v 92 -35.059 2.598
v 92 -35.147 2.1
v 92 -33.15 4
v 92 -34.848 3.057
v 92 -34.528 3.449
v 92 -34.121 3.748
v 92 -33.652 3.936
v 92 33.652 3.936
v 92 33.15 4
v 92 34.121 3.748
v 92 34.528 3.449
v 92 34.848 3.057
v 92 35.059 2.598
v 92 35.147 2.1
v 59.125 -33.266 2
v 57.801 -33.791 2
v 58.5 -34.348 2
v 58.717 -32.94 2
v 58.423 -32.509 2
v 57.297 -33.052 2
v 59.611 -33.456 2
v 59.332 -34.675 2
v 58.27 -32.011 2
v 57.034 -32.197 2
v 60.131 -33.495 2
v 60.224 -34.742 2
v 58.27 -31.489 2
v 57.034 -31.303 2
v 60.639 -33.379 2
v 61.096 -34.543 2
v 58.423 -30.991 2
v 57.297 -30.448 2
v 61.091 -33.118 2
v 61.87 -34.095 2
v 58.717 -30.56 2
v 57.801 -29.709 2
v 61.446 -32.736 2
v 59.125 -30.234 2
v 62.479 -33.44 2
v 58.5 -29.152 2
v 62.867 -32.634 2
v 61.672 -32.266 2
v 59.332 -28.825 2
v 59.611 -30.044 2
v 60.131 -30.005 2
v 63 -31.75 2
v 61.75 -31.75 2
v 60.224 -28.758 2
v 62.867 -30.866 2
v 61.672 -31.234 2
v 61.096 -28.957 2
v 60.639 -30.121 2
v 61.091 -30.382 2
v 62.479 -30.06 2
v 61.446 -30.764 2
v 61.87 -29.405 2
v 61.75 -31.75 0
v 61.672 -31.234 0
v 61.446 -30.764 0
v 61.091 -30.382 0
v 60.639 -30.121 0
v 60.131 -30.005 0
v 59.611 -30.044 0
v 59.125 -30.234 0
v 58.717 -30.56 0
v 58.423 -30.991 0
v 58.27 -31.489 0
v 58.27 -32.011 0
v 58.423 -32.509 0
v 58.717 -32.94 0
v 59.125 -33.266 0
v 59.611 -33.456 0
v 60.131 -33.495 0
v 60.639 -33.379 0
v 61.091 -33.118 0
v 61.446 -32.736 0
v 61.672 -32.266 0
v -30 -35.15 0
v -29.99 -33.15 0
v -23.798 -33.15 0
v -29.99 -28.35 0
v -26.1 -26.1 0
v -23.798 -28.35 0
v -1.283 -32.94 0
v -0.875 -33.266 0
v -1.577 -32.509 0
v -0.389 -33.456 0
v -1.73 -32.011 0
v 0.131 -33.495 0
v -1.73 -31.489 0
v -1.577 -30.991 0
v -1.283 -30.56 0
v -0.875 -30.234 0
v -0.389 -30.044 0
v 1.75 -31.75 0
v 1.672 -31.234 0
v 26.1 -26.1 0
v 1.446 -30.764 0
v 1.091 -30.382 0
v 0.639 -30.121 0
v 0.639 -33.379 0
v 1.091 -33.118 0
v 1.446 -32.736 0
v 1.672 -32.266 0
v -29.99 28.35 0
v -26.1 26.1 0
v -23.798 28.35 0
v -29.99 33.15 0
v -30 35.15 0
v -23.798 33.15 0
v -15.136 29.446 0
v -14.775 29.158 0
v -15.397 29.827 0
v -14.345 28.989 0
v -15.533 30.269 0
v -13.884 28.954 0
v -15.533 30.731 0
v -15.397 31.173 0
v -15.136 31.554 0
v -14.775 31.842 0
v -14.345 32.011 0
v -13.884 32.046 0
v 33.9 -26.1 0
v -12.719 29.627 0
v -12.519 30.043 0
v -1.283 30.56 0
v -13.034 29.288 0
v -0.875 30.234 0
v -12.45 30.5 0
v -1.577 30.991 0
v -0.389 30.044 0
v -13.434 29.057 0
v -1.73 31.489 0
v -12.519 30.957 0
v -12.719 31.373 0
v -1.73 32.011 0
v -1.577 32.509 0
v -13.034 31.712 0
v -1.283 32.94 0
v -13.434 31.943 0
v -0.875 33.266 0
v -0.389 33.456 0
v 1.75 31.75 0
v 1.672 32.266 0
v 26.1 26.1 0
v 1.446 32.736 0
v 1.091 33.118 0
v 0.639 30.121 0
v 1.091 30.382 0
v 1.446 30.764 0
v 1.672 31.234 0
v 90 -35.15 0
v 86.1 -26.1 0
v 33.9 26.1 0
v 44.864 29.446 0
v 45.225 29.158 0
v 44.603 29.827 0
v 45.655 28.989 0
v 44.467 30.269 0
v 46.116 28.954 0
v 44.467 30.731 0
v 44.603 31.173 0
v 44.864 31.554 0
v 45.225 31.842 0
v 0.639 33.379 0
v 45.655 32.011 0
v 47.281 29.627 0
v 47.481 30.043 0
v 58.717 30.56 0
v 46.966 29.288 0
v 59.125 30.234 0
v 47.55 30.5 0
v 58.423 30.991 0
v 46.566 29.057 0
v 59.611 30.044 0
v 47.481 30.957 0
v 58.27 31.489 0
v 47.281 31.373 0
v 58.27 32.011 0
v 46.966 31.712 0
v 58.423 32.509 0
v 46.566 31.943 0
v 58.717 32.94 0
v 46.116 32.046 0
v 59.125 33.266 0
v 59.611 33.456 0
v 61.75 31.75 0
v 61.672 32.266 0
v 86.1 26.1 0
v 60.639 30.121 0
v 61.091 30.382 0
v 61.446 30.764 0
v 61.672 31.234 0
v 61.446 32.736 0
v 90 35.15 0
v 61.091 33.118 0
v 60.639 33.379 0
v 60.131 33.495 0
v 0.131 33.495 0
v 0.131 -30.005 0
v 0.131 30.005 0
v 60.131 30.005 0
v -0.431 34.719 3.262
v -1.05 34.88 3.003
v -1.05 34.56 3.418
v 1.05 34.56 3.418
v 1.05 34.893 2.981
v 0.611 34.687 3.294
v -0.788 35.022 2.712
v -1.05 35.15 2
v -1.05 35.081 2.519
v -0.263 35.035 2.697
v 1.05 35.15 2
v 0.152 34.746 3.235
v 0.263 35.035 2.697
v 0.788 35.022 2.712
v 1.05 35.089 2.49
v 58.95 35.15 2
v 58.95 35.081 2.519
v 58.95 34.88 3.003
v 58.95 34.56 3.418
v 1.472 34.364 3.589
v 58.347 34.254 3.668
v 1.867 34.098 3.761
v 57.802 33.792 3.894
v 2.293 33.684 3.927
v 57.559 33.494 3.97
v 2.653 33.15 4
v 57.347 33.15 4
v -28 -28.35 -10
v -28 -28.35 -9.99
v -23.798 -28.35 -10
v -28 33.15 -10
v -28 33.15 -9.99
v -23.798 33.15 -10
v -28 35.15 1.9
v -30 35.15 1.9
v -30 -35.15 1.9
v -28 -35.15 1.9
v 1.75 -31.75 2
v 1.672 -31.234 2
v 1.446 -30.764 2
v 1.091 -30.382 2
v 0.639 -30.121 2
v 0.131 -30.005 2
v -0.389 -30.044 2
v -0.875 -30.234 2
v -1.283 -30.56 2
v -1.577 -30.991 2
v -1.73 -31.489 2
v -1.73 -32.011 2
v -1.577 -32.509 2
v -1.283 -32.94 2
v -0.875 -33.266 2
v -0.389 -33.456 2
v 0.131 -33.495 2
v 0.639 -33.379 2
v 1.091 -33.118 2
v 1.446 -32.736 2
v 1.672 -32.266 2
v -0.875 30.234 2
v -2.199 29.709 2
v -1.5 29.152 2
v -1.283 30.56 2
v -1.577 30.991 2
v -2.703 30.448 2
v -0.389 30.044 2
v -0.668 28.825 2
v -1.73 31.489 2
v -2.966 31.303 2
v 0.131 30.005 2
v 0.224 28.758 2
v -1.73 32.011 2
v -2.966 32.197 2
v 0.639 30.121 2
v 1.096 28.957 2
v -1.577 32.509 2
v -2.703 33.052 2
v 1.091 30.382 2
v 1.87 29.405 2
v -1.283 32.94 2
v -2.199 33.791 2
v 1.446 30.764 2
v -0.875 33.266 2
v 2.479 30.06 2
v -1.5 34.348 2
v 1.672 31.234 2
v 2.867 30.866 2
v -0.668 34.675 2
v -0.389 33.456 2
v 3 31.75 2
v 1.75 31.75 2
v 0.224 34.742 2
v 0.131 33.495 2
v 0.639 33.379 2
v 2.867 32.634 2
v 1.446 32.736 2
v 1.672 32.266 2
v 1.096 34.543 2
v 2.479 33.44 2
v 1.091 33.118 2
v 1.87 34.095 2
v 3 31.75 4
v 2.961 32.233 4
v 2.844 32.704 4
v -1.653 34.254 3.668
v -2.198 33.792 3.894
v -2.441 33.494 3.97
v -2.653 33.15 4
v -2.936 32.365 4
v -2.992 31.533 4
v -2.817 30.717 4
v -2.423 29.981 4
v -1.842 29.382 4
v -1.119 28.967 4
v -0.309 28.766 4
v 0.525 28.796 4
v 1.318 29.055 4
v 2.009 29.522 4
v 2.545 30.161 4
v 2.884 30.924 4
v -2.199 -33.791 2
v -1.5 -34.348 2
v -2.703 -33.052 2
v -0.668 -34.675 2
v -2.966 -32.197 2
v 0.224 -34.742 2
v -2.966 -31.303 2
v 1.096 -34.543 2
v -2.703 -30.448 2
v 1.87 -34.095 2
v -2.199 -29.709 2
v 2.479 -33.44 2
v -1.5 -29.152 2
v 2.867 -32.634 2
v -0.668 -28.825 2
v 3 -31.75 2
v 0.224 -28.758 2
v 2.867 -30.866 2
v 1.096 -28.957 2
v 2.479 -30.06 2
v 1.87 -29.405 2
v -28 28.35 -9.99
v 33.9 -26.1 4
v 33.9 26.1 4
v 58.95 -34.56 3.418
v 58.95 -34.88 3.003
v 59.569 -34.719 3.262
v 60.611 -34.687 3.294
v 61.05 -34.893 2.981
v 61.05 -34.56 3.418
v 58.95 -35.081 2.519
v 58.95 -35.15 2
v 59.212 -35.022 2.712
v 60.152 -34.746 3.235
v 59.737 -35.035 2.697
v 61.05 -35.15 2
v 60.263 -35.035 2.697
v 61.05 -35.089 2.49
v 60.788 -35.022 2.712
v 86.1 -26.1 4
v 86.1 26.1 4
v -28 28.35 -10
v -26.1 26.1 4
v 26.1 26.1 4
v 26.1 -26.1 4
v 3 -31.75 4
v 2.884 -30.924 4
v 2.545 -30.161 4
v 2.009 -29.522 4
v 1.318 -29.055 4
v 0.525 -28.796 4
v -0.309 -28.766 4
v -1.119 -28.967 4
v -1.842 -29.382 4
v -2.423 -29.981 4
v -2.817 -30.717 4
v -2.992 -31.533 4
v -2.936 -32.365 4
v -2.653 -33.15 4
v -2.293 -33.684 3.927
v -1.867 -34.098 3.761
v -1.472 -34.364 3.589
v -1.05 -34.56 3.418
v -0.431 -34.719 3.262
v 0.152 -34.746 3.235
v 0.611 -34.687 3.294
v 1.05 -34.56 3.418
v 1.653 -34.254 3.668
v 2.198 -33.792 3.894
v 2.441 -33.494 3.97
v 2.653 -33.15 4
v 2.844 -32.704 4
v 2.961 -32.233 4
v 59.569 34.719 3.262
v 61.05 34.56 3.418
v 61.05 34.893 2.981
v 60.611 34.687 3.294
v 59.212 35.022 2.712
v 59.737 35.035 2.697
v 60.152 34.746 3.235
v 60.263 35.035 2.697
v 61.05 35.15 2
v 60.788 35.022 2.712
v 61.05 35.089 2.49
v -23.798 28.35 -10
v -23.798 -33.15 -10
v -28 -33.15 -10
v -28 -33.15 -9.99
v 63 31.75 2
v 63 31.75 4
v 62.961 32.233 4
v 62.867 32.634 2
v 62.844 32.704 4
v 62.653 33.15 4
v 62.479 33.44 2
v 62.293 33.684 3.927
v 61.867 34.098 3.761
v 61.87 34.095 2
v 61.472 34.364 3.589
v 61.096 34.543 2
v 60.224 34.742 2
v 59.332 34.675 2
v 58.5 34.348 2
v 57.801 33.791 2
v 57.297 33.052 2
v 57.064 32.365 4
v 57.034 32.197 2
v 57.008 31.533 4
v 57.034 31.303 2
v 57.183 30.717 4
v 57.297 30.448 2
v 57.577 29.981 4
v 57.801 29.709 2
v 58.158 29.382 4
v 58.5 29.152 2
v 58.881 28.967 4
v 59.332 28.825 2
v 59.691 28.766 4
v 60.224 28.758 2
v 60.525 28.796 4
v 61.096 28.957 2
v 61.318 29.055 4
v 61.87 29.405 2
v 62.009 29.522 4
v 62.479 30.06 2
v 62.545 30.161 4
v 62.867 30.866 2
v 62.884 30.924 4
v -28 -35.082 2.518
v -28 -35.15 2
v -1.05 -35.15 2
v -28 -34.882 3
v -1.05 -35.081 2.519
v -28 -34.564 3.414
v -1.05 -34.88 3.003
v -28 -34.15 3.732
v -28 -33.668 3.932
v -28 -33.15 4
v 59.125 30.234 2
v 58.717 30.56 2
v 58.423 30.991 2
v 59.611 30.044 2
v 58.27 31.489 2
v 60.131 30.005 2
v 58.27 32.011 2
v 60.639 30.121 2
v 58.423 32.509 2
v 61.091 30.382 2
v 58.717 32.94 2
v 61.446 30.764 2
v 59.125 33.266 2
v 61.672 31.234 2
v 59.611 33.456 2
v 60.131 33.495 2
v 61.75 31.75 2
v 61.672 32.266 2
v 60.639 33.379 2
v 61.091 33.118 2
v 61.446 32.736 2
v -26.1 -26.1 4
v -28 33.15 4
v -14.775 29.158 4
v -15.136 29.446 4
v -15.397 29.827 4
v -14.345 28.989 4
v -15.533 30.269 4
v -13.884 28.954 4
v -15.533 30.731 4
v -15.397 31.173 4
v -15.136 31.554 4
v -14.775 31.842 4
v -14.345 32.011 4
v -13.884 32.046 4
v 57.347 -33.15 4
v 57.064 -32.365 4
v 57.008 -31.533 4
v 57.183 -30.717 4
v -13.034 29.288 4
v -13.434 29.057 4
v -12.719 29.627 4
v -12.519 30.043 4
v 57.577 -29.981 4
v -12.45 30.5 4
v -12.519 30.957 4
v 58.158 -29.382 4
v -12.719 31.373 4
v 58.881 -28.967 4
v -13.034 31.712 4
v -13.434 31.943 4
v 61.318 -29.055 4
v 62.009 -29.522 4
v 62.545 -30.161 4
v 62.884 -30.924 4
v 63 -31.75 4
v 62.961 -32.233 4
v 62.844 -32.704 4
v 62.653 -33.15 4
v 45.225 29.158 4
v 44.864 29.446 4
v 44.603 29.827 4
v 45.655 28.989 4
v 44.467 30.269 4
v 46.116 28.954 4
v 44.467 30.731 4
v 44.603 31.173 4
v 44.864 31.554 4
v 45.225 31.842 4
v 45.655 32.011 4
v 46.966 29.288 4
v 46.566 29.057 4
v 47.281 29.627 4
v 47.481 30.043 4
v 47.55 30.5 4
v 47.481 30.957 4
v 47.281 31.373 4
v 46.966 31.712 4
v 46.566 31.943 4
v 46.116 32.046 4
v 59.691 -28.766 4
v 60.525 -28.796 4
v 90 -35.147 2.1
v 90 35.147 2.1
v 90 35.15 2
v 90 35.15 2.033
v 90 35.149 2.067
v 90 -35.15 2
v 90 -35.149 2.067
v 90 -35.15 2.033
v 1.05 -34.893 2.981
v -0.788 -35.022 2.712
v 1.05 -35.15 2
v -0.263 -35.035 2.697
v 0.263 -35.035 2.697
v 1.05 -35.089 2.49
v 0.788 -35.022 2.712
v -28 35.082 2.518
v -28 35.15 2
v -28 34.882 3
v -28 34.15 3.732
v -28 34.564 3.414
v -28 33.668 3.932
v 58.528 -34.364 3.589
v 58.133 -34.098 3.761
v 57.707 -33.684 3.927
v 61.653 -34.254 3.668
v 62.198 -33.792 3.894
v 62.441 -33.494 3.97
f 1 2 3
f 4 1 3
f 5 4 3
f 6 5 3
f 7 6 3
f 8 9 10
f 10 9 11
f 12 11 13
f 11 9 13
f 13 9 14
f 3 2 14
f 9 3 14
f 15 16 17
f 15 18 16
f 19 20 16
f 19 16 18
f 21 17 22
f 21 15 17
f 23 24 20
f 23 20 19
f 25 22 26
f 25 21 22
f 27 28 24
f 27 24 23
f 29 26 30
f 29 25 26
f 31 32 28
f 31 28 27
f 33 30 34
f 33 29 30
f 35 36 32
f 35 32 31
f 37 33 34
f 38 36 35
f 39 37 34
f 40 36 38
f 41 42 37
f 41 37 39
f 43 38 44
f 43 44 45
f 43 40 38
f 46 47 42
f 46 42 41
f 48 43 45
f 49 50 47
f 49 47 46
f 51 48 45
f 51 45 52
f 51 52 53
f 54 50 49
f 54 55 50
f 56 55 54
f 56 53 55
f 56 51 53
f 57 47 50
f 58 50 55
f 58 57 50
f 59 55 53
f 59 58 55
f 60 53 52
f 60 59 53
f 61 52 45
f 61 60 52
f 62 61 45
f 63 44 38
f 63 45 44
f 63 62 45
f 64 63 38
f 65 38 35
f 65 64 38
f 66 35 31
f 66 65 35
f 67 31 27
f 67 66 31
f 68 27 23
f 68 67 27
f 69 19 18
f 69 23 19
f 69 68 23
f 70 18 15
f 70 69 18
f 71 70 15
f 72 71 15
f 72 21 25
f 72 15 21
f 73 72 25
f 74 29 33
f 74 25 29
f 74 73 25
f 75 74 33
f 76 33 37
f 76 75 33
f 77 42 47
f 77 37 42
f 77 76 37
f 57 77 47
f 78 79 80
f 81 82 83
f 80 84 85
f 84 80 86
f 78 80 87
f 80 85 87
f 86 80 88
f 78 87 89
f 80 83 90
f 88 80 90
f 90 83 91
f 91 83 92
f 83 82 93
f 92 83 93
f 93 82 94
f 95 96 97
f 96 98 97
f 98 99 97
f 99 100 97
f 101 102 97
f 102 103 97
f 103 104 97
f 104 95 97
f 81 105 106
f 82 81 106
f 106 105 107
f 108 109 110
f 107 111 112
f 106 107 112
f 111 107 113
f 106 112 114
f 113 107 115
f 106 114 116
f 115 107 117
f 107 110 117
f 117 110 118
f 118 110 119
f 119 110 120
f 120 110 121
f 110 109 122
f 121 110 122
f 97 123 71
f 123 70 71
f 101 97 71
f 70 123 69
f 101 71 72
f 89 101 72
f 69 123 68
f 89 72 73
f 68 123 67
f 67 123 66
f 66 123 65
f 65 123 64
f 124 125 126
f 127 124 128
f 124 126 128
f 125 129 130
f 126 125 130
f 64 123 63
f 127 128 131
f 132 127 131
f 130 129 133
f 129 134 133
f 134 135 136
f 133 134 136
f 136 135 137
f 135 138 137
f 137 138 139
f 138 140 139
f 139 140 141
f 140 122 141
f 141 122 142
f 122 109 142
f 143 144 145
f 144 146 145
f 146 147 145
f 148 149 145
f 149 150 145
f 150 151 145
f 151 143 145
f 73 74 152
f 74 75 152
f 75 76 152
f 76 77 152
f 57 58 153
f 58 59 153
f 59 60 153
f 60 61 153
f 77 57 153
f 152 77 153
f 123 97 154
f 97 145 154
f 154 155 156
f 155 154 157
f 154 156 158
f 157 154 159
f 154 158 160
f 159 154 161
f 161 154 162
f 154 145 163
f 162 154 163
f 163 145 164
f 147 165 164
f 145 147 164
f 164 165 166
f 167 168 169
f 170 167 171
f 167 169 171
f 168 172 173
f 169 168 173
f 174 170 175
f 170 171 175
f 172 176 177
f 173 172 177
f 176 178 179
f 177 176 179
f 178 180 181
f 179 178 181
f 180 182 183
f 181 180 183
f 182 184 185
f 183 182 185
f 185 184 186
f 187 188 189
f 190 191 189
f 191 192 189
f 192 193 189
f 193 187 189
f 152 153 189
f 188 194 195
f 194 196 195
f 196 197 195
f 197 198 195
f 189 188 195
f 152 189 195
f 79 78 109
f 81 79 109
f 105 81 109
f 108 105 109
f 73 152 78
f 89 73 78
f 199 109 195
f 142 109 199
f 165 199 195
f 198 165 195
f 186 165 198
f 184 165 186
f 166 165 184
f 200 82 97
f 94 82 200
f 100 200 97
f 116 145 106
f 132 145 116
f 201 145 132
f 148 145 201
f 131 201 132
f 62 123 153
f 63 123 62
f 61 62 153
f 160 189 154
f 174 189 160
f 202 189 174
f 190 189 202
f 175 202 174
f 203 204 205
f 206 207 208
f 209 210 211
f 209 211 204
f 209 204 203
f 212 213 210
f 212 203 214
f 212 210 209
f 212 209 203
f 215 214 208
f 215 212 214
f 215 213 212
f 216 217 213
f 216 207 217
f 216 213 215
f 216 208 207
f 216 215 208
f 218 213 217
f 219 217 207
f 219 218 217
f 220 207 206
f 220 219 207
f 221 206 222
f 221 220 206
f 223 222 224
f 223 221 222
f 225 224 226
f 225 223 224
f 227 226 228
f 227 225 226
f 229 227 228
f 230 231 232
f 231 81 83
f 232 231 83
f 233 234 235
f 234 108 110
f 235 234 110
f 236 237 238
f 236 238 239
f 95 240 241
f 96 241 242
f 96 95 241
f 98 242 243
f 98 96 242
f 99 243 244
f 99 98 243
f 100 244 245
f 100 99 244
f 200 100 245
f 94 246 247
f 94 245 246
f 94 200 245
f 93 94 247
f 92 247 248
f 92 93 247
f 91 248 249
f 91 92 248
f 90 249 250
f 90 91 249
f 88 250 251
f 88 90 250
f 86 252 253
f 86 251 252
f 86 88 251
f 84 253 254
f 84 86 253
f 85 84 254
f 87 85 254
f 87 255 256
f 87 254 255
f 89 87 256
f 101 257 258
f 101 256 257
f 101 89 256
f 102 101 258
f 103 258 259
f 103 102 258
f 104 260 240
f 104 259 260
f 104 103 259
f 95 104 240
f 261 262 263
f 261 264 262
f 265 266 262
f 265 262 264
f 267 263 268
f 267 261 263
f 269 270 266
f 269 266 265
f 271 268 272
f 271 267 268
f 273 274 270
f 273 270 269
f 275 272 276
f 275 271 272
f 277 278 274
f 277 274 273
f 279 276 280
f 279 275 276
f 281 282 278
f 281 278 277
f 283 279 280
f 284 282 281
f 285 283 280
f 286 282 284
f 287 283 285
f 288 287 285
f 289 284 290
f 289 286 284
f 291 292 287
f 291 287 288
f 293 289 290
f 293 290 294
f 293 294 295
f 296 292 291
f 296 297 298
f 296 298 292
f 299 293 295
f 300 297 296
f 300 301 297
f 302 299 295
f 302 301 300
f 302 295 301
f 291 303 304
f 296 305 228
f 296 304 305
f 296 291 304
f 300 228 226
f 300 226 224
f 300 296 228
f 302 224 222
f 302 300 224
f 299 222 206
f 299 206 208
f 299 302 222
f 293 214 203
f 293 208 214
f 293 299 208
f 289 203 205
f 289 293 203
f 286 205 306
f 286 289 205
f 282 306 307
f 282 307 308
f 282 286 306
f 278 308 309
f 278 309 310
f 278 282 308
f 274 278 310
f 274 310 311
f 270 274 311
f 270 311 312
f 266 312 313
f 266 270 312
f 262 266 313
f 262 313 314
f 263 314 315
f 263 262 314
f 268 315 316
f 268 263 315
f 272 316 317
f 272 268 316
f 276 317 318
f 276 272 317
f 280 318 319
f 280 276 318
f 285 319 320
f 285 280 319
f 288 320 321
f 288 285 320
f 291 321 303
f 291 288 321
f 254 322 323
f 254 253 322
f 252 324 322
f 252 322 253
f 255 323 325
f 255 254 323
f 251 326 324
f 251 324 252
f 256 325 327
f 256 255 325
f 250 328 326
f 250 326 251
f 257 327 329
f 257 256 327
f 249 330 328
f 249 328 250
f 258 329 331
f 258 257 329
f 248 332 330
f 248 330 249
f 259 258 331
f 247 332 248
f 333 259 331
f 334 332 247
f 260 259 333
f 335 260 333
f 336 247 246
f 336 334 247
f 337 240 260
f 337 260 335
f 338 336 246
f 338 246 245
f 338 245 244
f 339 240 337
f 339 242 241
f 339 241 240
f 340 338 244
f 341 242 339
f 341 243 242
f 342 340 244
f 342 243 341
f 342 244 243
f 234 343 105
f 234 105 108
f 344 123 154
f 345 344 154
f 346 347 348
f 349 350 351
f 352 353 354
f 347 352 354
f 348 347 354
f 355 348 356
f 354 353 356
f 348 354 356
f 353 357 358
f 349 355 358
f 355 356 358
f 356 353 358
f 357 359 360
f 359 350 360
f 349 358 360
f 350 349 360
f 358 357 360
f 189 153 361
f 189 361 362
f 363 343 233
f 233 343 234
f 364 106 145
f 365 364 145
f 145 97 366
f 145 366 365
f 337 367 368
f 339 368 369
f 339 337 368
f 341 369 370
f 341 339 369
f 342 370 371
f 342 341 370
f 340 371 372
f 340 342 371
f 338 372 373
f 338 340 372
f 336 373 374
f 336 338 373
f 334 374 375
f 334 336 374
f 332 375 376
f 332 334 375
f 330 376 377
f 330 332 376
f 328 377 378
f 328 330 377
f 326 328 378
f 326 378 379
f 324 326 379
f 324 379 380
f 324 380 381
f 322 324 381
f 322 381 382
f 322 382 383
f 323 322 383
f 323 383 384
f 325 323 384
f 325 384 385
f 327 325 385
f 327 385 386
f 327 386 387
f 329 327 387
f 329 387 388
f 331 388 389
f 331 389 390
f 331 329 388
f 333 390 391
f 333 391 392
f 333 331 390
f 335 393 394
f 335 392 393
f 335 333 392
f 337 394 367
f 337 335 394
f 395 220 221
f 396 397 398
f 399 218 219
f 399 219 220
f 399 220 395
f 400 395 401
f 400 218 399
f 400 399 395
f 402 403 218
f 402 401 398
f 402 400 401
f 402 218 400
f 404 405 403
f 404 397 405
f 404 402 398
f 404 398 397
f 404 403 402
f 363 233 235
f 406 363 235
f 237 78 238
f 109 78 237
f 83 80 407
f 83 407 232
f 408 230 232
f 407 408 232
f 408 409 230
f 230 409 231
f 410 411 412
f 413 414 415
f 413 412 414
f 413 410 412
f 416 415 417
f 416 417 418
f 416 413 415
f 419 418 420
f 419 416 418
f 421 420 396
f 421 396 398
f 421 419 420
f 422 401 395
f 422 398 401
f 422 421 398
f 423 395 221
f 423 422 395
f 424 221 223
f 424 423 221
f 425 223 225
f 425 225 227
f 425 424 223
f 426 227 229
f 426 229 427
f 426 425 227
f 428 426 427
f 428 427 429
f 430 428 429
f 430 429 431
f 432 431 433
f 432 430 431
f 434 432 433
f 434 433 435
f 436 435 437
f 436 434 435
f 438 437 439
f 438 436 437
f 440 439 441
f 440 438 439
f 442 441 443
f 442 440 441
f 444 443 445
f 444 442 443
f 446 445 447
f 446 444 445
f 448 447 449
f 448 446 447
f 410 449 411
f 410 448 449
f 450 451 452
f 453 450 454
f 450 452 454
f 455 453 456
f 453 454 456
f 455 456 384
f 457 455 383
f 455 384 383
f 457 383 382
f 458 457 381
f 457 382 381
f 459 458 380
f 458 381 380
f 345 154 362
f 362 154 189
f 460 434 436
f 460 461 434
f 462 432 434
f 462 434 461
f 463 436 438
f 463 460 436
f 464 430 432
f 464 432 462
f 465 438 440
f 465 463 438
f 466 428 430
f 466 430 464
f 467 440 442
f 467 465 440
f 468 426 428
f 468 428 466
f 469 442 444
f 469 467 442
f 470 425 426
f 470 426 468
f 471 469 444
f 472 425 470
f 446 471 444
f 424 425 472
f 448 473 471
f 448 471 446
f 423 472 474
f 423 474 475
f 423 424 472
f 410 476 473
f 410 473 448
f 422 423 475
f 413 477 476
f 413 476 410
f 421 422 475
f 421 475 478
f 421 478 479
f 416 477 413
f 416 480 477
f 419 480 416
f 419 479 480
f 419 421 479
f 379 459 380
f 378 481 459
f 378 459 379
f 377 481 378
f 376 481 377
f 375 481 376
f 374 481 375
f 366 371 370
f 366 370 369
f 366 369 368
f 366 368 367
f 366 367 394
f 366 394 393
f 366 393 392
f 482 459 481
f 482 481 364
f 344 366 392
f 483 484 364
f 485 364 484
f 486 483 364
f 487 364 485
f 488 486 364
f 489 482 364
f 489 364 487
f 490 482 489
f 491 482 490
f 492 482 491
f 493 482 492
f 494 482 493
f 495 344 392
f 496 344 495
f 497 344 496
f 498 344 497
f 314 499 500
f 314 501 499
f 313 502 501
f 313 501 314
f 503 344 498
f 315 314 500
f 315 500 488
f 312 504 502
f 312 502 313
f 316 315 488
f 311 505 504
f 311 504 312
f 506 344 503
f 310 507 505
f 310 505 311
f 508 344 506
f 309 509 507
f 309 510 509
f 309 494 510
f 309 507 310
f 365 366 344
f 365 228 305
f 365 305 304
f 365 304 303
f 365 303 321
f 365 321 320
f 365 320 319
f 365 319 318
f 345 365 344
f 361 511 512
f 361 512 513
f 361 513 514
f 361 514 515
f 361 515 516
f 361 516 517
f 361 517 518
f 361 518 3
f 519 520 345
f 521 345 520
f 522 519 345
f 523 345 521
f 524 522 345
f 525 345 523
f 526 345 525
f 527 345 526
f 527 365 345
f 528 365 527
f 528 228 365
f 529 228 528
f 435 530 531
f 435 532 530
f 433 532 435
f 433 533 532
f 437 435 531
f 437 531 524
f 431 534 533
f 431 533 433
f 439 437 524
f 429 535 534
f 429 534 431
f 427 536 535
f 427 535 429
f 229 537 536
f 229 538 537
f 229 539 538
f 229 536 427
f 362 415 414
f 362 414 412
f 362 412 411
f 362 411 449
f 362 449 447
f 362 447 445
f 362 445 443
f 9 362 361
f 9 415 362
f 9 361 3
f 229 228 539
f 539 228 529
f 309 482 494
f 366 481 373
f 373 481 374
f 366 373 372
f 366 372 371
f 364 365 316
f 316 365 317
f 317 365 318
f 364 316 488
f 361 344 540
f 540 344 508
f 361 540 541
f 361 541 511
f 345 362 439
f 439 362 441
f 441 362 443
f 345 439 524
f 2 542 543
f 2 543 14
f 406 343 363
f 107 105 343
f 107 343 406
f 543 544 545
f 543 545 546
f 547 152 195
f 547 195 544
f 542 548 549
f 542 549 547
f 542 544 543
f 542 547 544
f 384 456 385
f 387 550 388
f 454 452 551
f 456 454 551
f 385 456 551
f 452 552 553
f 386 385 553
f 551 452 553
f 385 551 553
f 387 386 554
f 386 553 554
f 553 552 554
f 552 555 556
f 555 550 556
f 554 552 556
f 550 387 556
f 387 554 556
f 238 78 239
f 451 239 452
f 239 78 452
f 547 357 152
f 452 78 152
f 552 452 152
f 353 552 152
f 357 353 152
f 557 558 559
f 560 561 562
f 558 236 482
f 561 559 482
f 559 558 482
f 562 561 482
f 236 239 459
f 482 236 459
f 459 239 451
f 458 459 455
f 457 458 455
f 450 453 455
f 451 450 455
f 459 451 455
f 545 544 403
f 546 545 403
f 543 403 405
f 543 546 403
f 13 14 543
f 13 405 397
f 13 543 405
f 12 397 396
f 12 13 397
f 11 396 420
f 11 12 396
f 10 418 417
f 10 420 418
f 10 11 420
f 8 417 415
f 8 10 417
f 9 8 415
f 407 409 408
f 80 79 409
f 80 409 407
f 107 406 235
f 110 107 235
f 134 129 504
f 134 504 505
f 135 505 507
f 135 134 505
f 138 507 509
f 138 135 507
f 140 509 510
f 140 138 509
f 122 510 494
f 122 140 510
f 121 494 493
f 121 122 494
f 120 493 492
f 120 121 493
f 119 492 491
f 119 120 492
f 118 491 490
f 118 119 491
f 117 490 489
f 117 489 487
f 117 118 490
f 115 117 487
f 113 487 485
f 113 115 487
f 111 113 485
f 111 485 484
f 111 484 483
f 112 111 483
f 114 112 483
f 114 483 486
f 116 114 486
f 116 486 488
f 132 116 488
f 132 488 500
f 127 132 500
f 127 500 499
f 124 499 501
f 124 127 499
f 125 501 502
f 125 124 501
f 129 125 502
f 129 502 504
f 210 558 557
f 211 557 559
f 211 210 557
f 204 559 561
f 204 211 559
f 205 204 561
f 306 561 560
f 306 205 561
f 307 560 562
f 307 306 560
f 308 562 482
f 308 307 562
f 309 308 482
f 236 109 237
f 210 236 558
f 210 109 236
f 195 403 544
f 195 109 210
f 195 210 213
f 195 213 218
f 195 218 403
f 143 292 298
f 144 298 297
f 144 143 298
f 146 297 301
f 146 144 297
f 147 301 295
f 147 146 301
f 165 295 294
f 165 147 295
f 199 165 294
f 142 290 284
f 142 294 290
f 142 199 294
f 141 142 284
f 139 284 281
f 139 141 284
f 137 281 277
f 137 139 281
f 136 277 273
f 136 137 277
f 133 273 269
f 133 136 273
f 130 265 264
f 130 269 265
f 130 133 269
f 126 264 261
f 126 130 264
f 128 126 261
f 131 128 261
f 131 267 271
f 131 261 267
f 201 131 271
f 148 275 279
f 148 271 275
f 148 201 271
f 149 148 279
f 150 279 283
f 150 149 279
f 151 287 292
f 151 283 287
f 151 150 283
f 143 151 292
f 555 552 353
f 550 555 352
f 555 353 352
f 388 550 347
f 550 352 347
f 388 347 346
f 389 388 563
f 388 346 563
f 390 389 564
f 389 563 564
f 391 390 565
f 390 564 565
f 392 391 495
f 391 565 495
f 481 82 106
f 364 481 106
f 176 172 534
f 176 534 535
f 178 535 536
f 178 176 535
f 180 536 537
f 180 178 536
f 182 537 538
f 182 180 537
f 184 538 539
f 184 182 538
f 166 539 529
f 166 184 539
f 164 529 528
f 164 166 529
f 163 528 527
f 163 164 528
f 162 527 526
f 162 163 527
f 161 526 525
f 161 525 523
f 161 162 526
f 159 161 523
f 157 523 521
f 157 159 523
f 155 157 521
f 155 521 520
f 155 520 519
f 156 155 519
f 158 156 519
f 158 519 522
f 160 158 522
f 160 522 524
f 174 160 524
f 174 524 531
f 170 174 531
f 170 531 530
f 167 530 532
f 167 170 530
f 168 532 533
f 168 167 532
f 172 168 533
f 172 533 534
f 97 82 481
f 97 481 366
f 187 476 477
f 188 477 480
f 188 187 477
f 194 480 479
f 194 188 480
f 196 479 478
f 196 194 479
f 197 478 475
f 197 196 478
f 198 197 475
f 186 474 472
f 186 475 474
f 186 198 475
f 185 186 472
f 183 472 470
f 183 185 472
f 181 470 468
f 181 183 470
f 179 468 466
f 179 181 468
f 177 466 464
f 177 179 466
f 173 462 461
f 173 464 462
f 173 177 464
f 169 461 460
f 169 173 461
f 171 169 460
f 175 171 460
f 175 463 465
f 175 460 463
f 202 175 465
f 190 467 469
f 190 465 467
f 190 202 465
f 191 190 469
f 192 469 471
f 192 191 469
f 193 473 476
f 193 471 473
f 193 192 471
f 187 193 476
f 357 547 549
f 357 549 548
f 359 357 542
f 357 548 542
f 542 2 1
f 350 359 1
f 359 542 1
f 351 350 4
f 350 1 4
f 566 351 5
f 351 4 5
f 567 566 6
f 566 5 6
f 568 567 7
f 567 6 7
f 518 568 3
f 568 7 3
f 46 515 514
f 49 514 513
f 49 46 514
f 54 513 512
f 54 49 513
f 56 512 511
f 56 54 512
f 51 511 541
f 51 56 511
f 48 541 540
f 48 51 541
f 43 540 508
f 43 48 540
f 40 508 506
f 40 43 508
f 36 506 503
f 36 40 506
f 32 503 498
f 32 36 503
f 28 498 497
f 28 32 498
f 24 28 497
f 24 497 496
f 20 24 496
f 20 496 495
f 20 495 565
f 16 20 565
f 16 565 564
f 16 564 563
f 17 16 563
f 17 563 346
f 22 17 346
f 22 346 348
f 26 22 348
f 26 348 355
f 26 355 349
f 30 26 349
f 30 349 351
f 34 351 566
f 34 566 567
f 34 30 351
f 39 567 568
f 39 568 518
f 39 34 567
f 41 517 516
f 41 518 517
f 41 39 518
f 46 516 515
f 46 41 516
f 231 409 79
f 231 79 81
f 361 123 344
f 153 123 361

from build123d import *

# Parameters (mm, degrees)
SKETCH101_W          = 122
SKETCH101_H          = 70.3
SKETCH101_R          = 1.75
SKETCH101_R_2        = 1.55
SKETCH101_W_2        = 52.2
SKETCH101_H_2        = 52.2
PAD033_DEPTH         = 4
FILLET008_R          = 2
SKETCH102_W          = 2
SKETCH102_H          = 2.1
POCKET051_DEPTH      = 35.151
POCKET051_DEPTH_BACK = 35.151
SKETCH103_R          = 3
POCKET039_DEPTH      = 2.001
SKETCH104_W          = 4.202
SKETCH104_H          = 4.8
PAD035_DEPTH         = 10
CHAMFER004_SIZE2     = 9.99
CHAMFER004_SIZE      = 1.99


with BuildPart() as part:
    # Sketch101 → Pad033 (new body)
    with BuildSketch(Plane.XY):
        with Locations((31, 0)):
            Rectangle(SKETCH101_W, SKETCH101_H)
        with Locations((0, 31.75)):
            Circle(SKETCH101_R, mode=Mode.SUBTRACT)
        with Locations((-14, 30.5)):
            Circle(SKETCH101_R_2, mode=Mode.SUBTRACT)
        with Locations((60, 31.75)):
            Circle(SKETCH101_R, mode=Mode.SUBTRACT)
        with Locations((46, 30.5)):
            Circle(SKETCH101_R_2, mode=Mode.SUBTRACT)
        with Locations((60, -31.75)):
            Circle(SKETCH101_R, mode=Mode.SUBTRACT)
        with Locations((0, -31.75)):
            Circle(SKETCH101_R, mode=Mode.SUBTRACT)
        Rectangle(SKETCH101_W_2, SKETCH101_H_2, mode=Mode.SUBTRACT)
        with Locations((60, 0)):
            Rectangle(SKETCH101_W_2, SKETCH101_H_2, mode=Mode.SUBTRACT)
    extrude(amount=PAD033_DEPTH)

    # Fillet008
    fillet008_edges = [part.edges().sort_by_distance(p)[0] for p in [
        (31, 35.15, 4),
        (31, -35.15, 4),
    ]]
    fillet(fillet008_edges, radius=FILLET008_R)

    # Sketch102 → Pocket051 (cut, two sides)
    with BuildSketch(Plane.XZ) as pocket051_sk:
        with Locations((-29, 2.95)):
            Rectangle(SKETCH102_W, SKETCH102_H)
        with Locations((91, 1.05)):
            Rectangle(SKETCH102_W, SKETCH102_H)
    extrude(amount=-POCKET051_DEPTH, mode=Mode.SUBTRACT)
    extrude(pocket051_sk.sketch, amount=POCKET051_DEPTH_BACK, mode=Mode.SUBTRACT)

    # Sketch103 → Pocket039 (cut, through all)
    with BuildSketch(Plane.XY.offset(2)):
        with Locations((0, 31.75)):
            Circle(SKETCH103_R)
        with Locations((60, 31.75)):
            Circle(SKETCH103_R)
        with Locations((60, -31.75)):
            Circle(SKETCH103_R)
        with Locations((0, -31.75)):
            Circle(SKETCH103_R)
    extrude(amount=POCKET039_DEPTH, mode=Mode.SUBTRACT)

    # Sketch104 → Pad035 (join)
    with BuildSketch(Plane.XY):
        with Locations((-25.899, 30.75)):
            Rectangle(SKETCH104_W, SKETCH104_H)
        with Locations((-25.899, -30.75)):
            Rectangle(SKETCH104_W, SKETCH104_H)
    extrude(amount=-PAD035_DEPTH)

    # Chamfer004
    chamfer004_edges = [part.edges().sort_by_distance(p)[0] for p in [
        (-28, -30.75, 0),
        (-28, 30.75, 0),
    ]]
    chamfer004_side = part.faces().sort_by_distance((30.852667, -0.159179, 0))[0]
    chamfer(chamfer004_edges, length=CHAMFER004_SIZE, length2=CHAMFER004_SIZE2, reference=chamfer004_side)


solid = part.part
